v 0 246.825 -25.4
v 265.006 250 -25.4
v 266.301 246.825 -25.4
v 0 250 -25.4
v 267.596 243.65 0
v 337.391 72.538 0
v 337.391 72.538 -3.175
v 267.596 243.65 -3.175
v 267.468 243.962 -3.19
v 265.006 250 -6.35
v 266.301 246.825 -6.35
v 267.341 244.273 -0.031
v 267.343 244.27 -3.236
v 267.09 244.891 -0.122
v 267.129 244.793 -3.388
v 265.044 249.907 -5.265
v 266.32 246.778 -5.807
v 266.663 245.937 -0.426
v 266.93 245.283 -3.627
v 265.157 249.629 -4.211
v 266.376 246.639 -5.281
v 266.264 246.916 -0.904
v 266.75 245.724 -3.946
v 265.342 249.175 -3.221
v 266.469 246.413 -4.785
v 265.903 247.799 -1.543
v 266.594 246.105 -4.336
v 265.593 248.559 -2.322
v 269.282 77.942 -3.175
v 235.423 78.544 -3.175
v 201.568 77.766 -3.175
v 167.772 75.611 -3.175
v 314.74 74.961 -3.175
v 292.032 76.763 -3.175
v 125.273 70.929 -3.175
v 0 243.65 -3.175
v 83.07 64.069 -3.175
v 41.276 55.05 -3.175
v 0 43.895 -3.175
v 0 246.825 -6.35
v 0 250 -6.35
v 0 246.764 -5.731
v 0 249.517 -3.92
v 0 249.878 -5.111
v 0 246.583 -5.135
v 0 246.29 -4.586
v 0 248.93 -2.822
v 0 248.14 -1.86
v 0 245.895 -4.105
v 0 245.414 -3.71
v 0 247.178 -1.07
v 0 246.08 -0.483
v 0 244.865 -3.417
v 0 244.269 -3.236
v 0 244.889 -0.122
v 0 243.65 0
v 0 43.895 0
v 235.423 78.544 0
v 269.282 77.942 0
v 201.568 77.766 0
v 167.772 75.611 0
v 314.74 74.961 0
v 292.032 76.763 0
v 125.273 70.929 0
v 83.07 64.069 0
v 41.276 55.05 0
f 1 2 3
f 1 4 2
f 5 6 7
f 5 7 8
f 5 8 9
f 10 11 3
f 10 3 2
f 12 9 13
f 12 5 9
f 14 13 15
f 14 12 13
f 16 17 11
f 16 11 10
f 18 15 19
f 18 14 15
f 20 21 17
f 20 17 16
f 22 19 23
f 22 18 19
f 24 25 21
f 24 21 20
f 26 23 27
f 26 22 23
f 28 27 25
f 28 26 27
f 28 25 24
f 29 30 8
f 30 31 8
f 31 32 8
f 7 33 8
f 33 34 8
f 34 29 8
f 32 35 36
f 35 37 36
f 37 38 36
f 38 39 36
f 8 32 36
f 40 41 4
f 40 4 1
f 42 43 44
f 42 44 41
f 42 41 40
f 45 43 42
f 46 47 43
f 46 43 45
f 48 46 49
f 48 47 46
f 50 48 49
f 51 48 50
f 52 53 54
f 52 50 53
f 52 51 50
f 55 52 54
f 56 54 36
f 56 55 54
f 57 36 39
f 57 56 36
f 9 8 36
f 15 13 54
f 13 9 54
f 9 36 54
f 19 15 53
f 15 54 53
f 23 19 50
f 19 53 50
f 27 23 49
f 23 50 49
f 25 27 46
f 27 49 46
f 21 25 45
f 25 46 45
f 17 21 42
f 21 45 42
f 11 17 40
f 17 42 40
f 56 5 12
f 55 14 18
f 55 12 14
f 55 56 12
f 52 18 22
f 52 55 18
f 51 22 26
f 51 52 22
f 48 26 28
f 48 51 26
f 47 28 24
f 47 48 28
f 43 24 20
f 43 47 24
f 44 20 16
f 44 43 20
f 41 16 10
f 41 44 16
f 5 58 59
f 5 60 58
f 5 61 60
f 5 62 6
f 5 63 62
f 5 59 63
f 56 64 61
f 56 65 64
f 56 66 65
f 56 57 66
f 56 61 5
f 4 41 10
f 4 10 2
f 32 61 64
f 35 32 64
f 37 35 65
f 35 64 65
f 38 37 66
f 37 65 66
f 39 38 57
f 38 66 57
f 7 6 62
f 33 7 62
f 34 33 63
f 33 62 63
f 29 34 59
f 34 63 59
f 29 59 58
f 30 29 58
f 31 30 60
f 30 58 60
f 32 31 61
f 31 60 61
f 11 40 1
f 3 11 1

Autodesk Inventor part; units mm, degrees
ref_plane "YZ Plane" through (0, 0, 0) normal (1, 0, 0) x (0, 1, 0)
ref_plane "XZ Plane" through (0, 0, 0) normal (0, 1, 0) x (-1, 0, 0)
ref_plane "XY Plane" through (0, 0, 0) normal (0, 0, 1) x (1, 0, 0)
sketch "Sketch1" plane through (0, 0, 0) normal (1, 0, 0) x (0, 1, 0)
  line L0 (0, 0) -> (250, 0)
  line L1 (250, 0) -> (250, -25.4)
  dimension "d0" = 25.4
  dimension "d1" = 250
contour flange "Contour Flange1" sketch "Sketch1" thickness 3.175 bend radius 3.175 width 350 along (1, 0, 0) mid plane no both sides no wall seen from (0, 125, 0) lies toward (0, 0, -1) curves L0 L1
bend "Bend1"
corner "Corner1"
sketch "Sketch2" plane through (0, 0, 0) normal (0, 0, 1) x (1, 0, 0)
  line L0 (350, 0) -> (350, 243.65) projected
  line L1 (0, 0) -> (0, 243.65) projected
  line L2 (0, 243.65) -> (350, 243.65) projected
  line L3 (0, 0) -> (0, 243.65) projected
  line L4 (350, 0) -> (0, 0) projected
  line L5 (350, 243.65) -> (350, 0) projected
  arc A0 (269.2821, 77.9424) -> (167.772, 75.6113) centre (237.5885, -753.3037) ccw
  arc A1 (167.772, 75.6113) -> (0, 43.8953) centre (237.5885, -753.3037) ccw
  arc A2 (350, 70.916) -> (269.2821, 77.9424) centre (237.5885, -753.3037) ccw
  point P0 (0, 61.7144)
  point P1 (350, 0)
  point P2 (350, 70.916)
  point P3 (0, 43.8953)
extrude "Cut1" cut sketch "Sketch2" against normal blind 3.175 contours L4 L1 A1 A0 A2 L0
sketch "Sketch7" plane through (0, 243.65, 0) normal (0, 0, 1) x (1, 0, 0)
  line L0 (350, 0) -> (350, -172.734) construction
  line L1 (0, 0) -> (350, 0) construction
  line L2 (0, -199.7547) -> (0, 0) construction
  line L3 (350, -202.0252) -> (265.0055, 6.35)
  line L4 (0, 6.35) -> (350, 6.35) construction
  line L5 (350, -202.0252) -> (350, 6.35)
  line L6 (350, 6.35) -> (265.0055, 6.35)
  arc A0 (350, -172.734) -> (0, -199.7547) centre (237.5885, -996.9537) ccw projected
  point P0 (0, -243.65)
  point P1 (346.825, 6.35)
  dimension "d56" = 22.19
extrude "Cut4" cut sketch "Sketch7" along normal through all both and the other way through all
equation "\"d14\" = Thickness"
equation "\"d57\" = Thickness"
equation "\"d2\" = Thickness"
equation "\"d3\" = BendReliefWidth"
equation "\"d4\" = BendReliefDepth"
equation "\"d5\" = MinimumRemnant"
equation "\"d6\" = TransitionRadius"
equation "\"d8\" = BendRadius"
equation "\"d10\" = CornerReliefSize"
equation "\"d11\" = GapSize"
equation "\"d12\" = JacobiRadiusSize"
equation "\"BendRadius\" = Thickness"
equation "\"BendReliefWidth\" = Thickness"
equation "\"BendReliefDepth\" = 0.5 * Thickness"
equation "\"CornerReliefSize\" = 4 * Thickness"
equation "\"MinimumRemnant\" = 2 * Thickness"
equation "\"TransitionRadius\" = BendRadius"
equation "\"JacobiRadiusSize\" = BendRadius"
equation "\"GapSize\" = Thickness"
equation "\"Thickness\" = 3.175"
properties part number "SIDE_INTAKE_LEXAN" material "Polycarbonate, PC 1000, Clear"
